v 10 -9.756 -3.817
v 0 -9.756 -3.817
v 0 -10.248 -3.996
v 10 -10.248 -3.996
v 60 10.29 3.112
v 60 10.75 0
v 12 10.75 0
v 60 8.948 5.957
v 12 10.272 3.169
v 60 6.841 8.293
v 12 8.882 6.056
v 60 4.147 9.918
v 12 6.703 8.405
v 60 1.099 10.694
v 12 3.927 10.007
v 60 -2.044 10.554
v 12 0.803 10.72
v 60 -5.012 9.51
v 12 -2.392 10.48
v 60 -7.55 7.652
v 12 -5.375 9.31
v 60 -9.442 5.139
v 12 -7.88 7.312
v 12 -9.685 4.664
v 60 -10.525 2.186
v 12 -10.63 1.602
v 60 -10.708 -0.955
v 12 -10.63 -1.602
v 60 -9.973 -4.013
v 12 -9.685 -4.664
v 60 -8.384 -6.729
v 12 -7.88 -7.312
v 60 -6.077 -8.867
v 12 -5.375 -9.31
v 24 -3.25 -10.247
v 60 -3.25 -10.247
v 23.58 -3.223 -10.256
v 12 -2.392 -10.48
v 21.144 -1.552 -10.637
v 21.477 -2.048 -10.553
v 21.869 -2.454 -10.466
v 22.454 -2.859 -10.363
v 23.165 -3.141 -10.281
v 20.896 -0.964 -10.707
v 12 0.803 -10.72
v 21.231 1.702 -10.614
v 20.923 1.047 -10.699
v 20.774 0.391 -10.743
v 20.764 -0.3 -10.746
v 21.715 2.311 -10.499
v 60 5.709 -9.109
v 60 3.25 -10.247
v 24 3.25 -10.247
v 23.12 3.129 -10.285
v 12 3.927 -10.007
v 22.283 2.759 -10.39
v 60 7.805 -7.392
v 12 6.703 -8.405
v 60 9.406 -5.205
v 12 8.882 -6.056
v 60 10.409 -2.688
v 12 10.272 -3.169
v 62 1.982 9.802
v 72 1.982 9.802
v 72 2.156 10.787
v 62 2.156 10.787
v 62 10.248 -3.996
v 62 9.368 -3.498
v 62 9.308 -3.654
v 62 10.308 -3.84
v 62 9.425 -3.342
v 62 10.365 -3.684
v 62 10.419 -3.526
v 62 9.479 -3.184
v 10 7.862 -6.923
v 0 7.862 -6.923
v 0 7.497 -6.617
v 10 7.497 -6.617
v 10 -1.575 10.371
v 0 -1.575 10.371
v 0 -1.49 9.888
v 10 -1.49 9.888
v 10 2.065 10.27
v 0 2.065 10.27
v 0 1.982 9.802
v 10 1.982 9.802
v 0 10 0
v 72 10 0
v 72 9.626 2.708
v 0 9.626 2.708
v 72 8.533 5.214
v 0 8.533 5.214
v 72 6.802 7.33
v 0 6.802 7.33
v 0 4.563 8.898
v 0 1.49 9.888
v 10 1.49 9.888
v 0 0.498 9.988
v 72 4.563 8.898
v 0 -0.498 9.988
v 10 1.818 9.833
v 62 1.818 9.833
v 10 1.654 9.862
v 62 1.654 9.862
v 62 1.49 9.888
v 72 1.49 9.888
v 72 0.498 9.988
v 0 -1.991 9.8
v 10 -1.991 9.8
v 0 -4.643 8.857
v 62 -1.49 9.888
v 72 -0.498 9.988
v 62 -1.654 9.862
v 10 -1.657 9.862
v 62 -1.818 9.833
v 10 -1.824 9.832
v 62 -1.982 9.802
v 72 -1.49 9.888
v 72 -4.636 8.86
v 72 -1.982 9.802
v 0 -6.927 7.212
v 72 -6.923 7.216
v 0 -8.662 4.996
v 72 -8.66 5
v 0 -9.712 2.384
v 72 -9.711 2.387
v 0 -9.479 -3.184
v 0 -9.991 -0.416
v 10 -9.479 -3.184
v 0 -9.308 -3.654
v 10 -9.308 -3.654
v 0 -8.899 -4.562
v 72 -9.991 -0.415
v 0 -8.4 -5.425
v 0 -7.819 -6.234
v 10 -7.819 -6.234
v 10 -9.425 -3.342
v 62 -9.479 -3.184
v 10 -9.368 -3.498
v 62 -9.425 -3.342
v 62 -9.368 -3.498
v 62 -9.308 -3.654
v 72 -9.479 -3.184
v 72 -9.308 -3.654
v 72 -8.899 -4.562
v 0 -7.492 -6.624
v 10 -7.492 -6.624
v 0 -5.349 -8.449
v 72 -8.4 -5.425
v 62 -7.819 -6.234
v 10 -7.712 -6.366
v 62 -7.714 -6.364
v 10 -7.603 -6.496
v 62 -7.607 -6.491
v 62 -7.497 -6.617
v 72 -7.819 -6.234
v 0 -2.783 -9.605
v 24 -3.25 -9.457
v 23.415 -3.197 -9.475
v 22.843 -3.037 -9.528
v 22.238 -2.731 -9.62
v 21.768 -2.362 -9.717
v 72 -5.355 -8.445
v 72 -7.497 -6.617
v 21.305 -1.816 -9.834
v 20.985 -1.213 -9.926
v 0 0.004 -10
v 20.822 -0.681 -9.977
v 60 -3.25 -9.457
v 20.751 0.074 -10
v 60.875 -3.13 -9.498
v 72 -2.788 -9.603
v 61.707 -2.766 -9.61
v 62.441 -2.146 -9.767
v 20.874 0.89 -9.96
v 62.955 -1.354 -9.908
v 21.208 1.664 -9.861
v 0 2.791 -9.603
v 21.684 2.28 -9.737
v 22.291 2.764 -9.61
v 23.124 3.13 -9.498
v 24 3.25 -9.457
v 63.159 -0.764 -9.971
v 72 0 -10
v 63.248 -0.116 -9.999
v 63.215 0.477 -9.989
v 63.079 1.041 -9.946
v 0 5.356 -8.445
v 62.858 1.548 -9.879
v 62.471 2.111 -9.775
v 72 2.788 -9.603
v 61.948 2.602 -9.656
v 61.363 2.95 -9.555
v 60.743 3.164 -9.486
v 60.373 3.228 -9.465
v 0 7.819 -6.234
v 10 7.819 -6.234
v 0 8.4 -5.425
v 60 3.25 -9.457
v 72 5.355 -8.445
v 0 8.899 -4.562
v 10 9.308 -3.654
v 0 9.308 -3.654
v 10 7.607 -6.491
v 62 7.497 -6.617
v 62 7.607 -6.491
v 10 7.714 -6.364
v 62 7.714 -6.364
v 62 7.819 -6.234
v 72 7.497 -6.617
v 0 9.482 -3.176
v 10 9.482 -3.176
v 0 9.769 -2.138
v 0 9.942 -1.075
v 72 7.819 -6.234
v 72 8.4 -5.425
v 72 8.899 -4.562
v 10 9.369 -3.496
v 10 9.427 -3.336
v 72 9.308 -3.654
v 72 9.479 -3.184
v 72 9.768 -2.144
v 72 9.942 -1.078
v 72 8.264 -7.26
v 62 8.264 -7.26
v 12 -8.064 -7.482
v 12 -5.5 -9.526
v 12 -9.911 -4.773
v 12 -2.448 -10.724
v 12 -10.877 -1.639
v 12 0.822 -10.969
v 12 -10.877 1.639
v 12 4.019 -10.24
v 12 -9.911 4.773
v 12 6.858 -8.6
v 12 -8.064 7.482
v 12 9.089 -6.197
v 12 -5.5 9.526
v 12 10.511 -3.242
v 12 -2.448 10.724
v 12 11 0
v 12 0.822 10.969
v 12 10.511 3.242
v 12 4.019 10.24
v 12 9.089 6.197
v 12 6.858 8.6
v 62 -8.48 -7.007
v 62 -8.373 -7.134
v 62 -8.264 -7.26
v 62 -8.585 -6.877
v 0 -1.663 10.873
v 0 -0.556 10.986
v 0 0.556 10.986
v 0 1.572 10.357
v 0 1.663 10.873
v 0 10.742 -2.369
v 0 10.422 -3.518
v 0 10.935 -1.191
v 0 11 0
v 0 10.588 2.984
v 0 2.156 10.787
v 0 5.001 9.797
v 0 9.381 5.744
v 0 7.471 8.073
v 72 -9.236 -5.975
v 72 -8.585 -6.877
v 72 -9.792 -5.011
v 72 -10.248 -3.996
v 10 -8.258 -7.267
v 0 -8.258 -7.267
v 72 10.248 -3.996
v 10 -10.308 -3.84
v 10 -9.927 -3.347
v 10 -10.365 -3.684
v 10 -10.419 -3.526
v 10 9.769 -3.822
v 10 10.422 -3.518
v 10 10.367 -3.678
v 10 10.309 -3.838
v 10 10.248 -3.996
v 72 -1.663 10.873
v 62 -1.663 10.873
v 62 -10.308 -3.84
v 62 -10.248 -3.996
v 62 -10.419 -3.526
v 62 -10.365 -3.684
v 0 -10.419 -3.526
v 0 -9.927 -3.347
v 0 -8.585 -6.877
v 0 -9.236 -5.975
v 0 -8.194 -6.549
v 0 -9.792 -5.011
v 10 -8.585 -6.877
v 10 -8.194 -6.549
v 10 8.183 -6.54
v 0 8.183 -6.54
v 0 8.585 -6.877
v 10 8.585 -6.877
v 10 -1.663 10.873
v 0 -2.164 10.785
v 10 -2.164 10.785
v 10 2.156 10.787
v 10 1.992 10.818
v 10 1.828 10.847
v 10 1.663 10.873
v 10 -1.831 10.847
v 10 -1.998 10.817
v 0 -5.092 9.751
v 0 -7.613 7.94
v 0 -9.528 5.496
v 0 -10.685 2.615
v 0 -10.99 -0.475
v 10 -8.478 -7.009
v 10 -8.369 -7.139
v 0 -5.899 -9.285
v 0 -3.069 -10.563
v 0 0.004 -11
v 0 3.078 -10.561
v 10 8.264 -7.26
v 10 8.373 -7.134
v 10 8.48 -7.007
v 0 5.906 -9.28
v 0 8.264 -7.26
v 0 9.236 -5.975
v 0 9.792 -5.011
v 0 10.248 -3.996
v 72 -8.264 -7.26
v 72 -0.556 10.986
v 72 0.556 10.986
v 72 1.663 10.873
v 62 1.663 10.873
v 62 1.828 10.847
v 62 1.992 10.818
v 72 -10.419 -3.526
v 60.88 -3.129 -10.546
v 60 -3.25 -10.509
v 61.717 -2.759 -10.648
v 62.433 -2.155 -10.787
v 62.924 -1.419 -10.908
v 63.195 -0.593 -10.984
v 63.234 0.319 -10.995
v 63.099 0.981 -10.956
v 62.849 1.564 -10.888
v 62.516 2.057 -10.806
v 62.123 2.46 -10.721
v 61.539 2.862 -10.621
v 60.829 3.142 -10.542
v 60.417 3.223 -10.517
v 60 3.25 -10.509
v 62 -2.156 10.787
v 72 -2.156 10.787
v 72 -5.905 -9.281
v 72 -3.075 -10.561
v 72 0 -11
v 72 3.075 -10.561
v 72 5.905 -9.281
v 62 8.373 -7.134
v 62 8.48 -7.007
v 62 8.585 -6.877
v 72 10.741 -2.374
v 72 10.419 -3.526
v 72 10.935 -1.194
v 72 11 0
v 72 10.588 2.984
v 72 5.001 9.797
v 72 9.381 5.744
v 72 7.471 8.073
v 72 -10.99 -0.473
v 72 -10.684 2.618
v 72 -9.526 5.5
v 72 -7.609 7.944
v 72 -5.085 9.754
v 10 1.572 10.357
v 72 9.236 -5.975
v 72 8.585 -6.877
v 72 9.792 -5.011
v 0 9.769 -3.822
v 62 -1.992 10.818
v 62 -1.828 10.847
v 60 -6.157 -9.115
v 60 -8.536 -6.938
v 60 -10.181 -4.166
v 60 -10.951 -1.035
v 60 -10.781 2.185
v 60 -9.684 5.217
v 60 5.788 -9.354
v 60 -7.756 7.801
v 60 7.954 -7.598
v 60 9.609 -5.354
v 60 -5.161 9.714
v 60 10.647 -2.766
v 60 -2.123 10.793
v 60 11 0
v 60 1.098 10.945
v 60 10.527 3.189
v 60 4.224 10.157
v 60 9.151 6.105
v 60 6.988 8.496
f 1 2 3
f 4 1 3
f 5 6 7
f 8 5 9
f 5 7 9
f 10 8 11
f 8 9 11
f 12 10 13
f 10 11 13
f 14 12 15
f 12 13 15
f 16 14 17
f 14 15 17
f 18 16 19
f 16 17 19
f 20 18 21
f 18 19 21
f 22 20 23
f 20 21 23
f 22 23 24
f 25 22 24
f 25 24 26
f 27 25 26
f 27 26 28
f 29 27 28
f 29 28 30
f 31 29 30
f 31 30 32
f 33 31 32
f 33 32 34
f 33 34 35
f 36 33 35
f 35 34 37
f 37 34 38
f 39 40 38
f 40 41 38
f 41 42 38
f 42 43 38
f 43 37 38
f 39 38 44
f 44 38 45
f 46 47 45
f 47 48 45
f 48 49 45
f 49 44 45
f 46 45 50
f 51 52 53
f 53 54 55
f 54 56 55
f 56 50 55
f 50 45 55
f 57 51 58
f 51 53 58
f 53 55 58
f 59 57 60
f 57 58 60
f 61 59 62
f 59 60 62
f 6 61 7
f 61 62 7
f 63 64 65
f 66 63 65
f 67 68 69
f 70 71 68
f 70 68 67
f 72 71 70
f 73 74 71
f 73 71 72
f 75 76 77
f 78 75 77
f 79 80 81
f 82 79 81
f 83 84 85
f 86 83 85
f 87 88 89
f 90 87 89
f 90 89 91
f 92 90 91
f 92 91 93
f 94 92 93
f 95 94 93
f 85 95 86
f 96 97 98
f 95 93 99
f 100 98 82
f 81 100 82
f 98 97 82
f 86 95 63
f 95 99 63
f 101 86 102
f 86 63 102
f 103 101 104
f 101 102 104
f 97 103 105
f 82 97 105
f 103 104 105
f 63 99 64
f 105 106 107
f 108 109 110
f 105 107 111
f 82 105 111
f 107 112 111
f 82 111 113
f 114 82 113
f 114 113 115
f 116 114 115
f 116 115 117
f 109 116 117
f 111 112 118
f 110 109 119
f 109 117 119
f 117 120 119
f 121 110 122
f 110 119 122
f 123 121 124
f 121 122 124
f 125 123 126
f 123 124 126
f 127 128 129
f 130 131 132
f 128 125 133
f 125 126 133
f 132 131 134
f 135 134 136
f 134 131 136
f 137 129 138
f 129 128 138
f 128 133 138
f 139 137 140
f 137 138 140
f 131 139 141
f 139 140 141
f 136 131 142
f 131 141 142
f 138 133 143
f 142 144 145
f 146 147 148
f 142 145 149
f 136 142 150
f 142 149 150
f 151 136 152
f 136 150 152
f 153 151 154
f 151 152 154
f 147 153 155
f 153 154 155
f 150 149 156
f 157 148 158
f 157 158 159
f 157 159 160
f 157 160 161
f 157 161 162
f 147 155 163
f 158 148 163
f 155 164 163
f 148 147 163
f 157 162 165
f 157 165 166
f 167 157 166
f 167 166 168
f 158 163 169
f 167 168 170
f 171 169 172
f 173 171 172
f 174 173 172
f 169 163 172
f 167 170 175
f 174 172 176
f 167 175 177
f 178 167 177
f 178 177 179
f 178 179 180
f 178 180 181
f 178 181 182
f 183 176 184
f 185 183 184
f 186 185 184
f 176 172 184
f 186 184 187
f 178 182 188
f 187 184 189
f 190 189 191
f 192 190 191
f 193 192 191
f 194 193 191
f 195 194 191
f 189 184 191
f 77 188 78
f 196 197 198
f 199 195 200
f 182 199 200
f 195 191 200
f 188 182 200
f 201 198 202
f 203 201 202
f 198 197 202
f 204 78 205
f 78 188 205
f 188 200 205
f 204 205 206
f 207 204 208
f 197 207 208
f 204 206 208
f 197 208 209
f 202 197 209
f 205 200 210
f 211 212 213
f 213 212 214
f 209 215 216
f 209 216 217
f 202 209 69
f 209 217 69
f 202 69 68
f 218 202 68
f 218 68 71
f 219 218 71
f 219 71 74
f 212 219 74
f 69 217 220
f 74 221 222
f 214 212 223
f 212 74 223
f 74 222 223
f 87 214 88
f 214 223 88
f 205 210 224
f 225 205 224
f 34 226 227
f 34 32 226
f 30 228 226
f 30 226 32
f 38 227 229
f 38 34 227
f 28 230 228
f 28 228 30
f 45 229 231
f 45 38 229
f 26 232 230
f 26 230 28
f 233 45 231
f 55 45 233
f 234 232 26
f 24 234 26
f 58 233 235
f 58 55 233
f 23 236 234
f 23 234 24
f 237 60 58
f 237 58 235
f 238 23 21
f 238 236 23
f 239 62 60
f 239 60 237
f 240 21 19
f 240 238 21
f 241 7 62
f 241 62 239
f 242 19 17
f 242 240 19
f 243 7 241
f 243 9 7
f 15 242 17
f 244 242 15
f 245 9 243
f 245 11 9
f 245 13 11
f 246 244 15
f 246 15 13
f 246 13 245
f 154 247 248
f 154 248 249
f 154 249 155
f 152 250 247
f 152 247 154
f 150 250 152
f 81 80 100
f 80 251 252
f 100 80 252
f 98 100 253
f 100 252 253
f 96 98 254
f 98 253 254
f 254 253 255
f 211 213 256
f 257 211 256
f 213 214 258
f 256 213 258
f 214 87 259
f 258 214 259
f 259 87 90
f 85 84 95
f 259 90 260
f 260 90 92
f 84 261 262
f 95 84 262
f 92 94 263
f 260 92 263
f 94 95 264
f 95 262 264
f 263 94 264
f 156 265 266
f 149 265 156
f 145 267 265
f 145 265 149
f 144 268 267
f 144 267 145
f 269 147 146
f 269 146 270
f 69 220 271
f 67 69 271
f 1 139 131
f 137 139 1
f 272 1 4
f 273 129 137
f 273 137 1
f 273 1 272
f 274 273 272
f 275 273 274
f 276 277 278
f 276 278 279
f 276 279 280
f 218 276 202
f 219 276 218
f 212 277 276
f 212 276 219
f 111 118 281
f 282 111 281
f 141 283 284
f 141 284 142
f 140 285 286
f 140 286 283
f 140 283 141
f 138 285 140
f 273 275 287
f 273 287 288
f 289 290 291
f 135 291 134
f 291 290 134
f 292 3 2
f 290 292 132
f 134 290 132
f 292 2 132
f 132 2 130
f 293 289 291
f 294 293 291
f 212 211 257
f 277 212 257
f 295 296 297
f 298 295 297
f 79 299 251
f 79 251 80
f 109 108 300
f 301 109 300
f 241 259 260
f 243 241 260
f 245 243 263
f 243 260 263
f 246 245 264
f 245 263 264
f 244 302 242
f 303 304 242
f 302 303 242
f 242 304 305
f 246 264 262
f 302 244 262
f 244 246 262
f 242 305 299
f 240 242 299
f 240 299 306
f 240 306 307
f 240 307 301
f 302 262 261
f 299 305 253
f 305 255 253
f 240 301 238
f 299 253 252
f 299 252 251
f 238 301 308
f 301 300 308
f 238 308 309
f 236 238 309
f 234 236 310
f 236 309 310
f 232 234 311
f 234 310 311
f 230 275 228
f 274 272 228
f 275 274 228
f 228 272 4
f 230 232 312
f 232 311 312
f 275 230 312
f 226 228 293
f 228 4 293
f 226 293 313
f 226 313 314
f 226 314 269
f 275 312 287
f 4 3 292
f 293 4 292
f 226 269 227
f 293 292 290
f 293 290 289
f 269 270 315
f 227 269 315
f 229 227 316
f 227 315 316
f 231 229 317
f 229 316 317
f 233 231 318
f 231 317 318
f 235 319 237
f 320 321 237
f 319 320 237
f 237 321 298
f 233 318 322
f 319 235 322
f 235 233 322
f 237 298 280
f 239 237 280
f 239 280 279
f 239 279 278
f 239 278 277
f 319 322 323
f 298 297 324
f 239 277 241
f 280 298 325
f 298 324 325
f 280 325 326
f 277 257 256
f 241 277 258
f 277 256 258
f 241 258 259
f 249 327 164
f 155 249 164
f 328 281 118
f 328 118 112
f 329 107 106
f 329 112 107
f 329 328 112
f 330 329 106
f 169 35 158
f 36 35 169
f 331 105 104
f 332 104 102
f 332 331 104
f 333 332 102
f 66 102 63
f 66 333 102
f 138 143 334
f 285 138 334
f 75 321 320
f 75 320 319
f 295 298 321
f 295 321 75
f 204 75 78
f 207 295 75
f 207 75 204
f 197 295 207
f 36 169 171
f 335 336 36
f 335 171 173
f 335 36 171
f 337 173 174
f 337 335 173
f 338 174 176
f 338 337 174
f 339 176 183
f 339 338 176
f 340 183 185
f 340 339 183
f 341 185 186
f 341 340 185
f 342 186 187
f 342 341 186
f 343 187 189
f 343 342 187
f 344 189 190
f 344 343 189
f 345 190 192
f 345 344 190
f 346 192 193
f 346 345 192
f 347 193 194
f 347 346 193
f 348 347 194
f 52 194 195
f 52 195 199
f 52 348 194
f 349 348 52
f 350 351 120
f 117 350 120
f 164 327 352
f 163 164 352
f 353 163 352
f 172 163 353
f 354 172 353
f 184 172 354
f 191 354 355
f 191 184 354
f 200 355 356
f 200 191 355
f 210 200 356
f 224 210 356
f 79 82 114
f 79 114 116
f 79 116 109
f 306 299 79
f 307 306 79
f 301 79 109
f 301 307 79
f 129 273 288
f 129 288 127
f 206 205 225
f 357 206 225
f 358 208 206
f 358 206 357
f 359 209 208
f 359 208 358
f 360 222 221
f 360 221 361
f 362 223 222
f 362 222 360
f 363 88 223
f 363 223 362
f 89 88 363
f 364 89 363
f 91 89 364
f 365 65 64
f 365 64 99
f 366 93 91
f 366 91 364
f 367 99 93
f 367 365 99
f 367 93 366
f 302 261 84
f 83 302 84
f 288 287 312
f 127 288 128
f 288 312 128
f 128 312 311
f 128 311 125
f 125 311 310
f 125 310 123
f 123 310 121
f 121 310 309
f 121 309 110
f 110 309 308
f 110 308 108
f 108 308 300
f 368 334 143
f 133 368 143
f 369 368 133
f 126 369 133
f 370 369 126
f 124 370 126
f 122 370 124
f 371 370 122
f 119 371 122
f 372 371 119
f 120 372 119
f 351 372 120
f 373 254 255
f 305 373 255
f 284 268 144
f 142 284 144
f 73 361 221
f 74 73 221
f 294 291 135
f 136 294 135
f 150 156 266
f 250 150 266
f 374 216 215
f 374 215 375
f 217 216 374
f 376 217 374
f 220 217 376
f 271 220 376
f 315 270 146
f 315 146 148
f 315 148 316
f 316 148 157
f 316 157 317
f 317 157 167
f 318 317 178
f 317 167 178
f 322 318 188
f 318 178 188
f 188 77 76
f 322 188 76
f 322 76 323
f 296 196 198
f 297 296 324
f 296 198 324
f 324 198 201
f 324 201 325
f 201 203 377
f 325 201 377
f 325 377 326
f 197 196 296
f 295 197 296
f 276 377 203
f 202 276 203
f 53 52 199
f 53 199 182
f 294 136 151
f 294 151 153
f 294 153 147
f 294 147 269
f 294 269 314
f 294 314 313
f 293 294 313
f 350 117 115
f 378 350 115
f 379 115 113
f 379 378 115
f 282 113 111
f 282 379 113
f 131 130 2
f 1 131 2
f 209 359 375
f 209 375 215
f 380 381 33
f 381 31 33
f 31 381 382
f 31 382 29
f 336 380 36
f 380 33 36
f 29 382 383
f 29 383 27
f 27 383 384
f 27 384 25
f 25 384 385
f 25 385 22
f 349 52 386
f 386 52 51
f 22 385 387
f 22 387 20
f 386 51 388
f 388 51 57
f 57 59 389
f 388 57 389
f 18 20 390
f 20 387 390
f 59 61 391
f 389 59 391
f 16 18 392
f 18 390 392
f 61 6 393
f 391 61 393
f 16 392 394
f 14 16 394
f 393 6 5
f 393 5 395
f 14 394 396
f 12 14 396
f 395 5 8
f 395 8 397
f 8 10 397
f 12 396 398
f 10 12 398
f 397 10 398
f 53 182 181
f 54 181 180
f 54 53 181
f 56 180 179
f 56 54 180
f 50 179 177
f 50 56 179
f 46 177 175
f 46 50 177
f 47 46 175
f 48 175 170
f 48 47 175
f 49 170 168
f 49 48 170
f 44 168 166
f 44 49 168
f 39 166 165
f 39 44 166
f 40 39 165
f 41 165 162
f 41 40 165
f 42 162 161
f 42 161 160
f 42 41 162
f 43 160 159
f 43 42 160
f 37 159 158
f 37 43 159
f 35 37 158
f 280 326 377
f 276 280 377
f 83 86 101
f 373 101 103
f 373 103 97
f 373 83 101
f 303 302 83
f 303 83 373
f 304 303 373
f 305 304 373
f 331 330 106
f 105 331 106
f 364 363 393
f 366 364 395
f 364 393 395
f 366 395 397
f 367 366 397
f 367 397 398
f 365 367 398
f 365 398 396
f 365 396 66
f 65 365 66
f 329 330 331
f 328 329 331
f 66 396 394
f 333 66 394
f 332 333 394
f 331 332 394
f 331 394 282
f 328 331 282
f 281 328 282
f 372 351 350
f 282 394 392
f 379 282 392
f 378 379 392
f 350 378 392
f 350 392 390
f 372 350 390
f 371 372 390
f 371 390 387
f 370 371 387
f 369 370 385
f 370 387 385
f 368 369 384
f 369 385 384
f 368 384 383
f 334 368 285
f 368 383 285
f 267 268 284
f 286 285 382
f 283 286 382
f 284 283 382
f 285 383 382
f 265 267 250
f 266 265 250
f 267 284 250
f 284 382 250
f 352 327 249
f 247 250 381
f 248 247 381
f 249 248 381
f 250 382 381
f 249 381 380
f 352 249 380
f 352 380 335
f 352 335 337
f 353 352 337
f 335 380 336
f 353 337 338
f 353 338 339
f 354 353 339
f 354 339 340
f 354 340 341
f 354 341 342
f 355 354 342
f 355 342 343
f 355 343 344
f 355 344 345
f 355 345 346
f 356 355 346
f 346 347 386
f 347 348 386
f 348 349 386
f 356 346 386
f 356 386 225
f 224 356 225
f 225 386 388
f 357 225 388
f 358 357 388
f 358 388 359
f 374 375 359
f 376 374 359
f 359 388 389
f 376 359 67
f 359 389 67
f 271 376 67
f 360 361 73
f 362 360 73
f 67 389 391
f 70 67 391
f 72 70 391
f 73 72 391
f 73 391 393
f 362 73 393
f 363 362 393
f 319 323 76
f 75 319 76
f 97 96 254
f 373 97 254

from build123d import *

# Parameters (mm, degrees)
F0_R      = 11
F1_DEPTH  = 12
F2_R      = 10.75
F3_DEPTH  = 48
F4_R      = 11
F4_R_2    = 10.75
F5_DEPTH  = 12
F7_D      = 20
F9_DEPTH  = 10
F11_DEPTH = 10
F14_DEPTH = 5


with BuildPart() as f1:
    # F0 (on Right) → F1 (new body)
    with BuildSketch(Plane.YZ):
        Circle(F0_R)
    extrude(amount=F1_DEPTH)

    # F2 (on face) → F3 (join)
    with BuildSketch(Plane.YZ.offset(12)):
        Circle(F2_R)
    extrude(amount=F3_DEPTH)

    # F4 (on face) → F5 (join)
    with BuildSketch(Plane.YZ.offset(60)):
        Circle(F4_R)
        Circle(F4_R_2, mode=Mode.SUBTRACT)
        Circle(F4_R_2)
    extrude(amount=F5_DEPTH)

    # F7 (through all)
    with Locations(Plane(origin=(0, 0, 0), x_dir=(0, -1, 0), z_dir=(-1, 0, 0))):
        with Locations((0, 0)):
            Hole(F7_D / 2)

    # F8 (on face) → F9 (cut)
    with BuildSketch(Plane(origin=(0, 0, 0), x_dir=(0, -1, 0), z_dir=(-1, 0, 0))):
        with BuildLine():
            Line((1.6634346337, 10.8734992169), (1.5748160855, 10.370918456))
            Line((1.5748160855, 10.370918456), (1.489737103, 9.8884115693))
            ThreePointArc((1.489737103, 9.8884115693), (1.7407460416, 9.8473246732), (1.9906288286, 9.7998671862))
            Line((1.9906288286, 9.7998671862), (2.1643298383, 10.7849745642))
            ThreePointArc((2.1643298383, 10.7849745642), (1.9143939946, 10.8321325524), (1.6634346337, 10.8734992169))
        make_face()
        with BuildLine():
            ThreePointArc((-1.9821409796, 9.8015874805), (-1.7364817767, 9.8480775301), (-1.489737103, 9.8884115693))
            Line((-1.489737103, 9.8884115693), (-1.572378121, 10.3570920718))
            Line((-1.572378121, 10.3570920718), (-1.6634346337, 10.8734992169))
            ThreePointArc((-1.6634346337, 10.8734992169), (-1.9101299543, 10.8328852831), (-2.1558385102, 10.786675128))
            Line((-2.1558385102, 10.786675128), (-2.0647819975, 10.270267983))
            Line((-2.0647819975, 10.270267983), (-1.9821409796, 9.8015874805))
        make_face()
        with BuildLine():
            Line((9.9267039757, -3.3469803284), (9.4794942453, -3.1842092981))
            ThreePointArc((9.4794942453, -3.1842092981), (9.3969262079, -3.4202014333), (9.3084841736, -3.6540556085))
            Line((9.3084841736, -3.6540556085), (9.755693904, -3.8168266388))
            Line((9.755693904, -3.8168266388), (10.2484438667, -3.9961729581))
            ThreePointArc((10.2484438667, -3.9961729581), (10.3366188286, -3.7622215766), (10.4194539383, -3.5263266477))
            Line((10.4194539383, -3.5263266477), (9.9267039757, -3.3469803284))
        make_face()
        with BuildLine():
            ThreePointArc((-9.3084841736, -3.6540556085), (-9.3984063471, -3.416132043), (-9.4822483512, -3.175998458))
            Line((-9.4822483512, -3.175998458), (-10.4222268709, -3.51812266))
            ThreePointArc((-10.4222268709, -3.51812266), (-10.3380989649, -3.758152444), (-10.2484438667, -3.9961729581))
            Line((-10.2484438667, -3.9961729581), (-9.7688868862, -3.8216284916))
            Line((-9.7688868862, -3.8216284916), (-9.3084841736, -3.6540556085))
        make_face()
        with BuildLine():
            Line((8.1940708007, -6.5492899644), (7.8187470706, -6.2343559608))
            ThreePointArc((7.8187470706, -6.2343559608), (7.6576603054, -6.4311926302), (7.4916195226, -6.6238687282))
            Line((7.4916195226, -6.6238687282), (8.2578970327, -7.2668519042))
            ThreePointArc((8.2578970327, -7.2668519042), (8.4237049702, -7.0739801084), (8.585009233, -6.8773262587))
            Line((8.585009233, -6.8773262587), (8.1940708007, -6.5492899644))
        make_face()
        with BuildLine():
            ThreePointArc((-7.4973532657, -6.6173781824), (-7.6604444312, -6.4278760969), (-7.8187470706, -6.2343559608))
            Line((-7.8187470706, -6.2343559608), (-8.1833157831, -6.540265433))
            Line((-8.1833157831, -6.540265433), (-8.585009233, -6.8773262587))
            ThreePointArc((-8.585009233, -6.8773262587), (-8.4264888743, -7.0706637066), (-8.2636154282, -7.2603484803))
            Line((-8.2636154282, -7.2603484803), (-7.8619219782, -6.9232876546))
            Line((-7.8619219782, -6.9232876546), (-7.4973532657, -6.6173781824))
        make_face()
    extrude(amount=-F9_DEPTH, mode=Mode.SUBTRACT)

    # F10 (on face) → F11 (cut)
    with BuildSketch(Plane.YZ.offset(72)):
        with BuildLine():
            ThreePointArc((-1.9821409796, 9.8015874805), (-1.7364817767, 9.8480775301), (-1.489737103, 9.8884115693))
            Line((-1.489737103, 9.8884115693), (-1.6634346337, 10.8734992169))
            ThreePointArc((-1.6634346337, 10.8734992169), (-1.9101299543, 10.8328852831), (-2.1558385102, 10.786675128))
            Line((-2.1558385102, 10.786675128), (-1.9821409796, 9.8015874805))
        make_face()
        with BuildLine():
            Line((1.6634346337, 10.8734992169), (1.489737103, 9.8884115693))
            ThreePointArc((1.489737103, 9.8884115693), (1.7364817767, 9.8480775301), (1.9821409796, 9.8015874805))
            Line((1.9821409796, 9.8015874805), (2.1558385102, 10.786675128))
            ThreePointArc((2.1558385102, 10.786675128), (1.9101299543, 10.8328852831), (1.6634346337, 10.8734992169))
        make_face()
        with BuildLine():
            Line((10.4194539383, -3.5263266477), (9.4794942453, -3.1842092981))
            ThreePointArc((9.4794942453, -3.1842092981), (9.3969262079, -3.4202014333), (9.3084841736, -3.6540556085))
            Line((9.3084841736, -3.6540556085), (10.2484438667, -3.9961729581))
            ThreePointArc((10.2484438667, -3.9961729581), (10.3366188286, -3.7622215766), (10.4194539383, -3.5263266477))
        make_face()
        with BuildLine():
            Line((8.585009233, -6.8773262587), (7.8187470706, -6.2343559608))
            ThreePointArc((7.8187470706, -6.2343559608), (7.6604444312, -6.4278760969), (7.4973532657, -6.6173781824))
            Line((7.4973532657, -6.6173781824), (8.2636154282, -7.2603484803))
            ThreePointArc((8.2636154282, -7.2603484803), (8.4264888743, -7.0706637066), (8.585009233, -6.8773262587))
        make_face()
        with BuildLine():
            ThreePointArc((-9.3084841736, -3.6540556085), (-9.3969262079, -3.4202014333), (-9.4794942453, -3.1842092981))
            Line((-9.4794942453, -3.1842092981), (-10.4194539383, -3.5263266477))
            ThreePointArc((-10.4194539383, -3.5263266477), (-10.3366188286, -3.7622215766), (-10.2484438667, -3.9961729581))
            Line((-10.2484438667, -3.9961729581), (-9.3084841736, -3.6540556085))
        make_face()
        with BuildLine():
            ThreePointArc((-7.4973532657, -6.6173781824), (-7.6604444312, -6.4278760969), (-7.8187470706, -6.2343559608))
            Line((-7.8187470706, -6.2343559608), (-8.585009233, -6.8773262587))
            ThreePointArc((-8.585009233, -6.8773262587), (-8.4264888743, -7.0706637066), (-8.2636154282, -7.2603484803))
            Line((-8.2636154282, -7.2603484803), (-7.4973532657, -6.6173781824))
        make_face()
    extrude(amount=-F11_DEPTH, mode=Mode.SUBTRACT)

    # F13 (on offset) → F14 (cut)
    with BuildSketch(Plane.XY.offset(-11)):
        with BuildLine():
            Line((24, -3.25), (60, -3.25))
            ThreePointArc((60, -3.25), (63.25, 0), (60, 3.25))
            Line((60, 3.25), (24, 3.25))
            ThreePointArc((24, 3.25), (20.75, 0), (24, -3.25))
        make_face()
    extrude(amount=F14_DEPTH, mode=Mode.SUBTRACT)


solid = f1.part
